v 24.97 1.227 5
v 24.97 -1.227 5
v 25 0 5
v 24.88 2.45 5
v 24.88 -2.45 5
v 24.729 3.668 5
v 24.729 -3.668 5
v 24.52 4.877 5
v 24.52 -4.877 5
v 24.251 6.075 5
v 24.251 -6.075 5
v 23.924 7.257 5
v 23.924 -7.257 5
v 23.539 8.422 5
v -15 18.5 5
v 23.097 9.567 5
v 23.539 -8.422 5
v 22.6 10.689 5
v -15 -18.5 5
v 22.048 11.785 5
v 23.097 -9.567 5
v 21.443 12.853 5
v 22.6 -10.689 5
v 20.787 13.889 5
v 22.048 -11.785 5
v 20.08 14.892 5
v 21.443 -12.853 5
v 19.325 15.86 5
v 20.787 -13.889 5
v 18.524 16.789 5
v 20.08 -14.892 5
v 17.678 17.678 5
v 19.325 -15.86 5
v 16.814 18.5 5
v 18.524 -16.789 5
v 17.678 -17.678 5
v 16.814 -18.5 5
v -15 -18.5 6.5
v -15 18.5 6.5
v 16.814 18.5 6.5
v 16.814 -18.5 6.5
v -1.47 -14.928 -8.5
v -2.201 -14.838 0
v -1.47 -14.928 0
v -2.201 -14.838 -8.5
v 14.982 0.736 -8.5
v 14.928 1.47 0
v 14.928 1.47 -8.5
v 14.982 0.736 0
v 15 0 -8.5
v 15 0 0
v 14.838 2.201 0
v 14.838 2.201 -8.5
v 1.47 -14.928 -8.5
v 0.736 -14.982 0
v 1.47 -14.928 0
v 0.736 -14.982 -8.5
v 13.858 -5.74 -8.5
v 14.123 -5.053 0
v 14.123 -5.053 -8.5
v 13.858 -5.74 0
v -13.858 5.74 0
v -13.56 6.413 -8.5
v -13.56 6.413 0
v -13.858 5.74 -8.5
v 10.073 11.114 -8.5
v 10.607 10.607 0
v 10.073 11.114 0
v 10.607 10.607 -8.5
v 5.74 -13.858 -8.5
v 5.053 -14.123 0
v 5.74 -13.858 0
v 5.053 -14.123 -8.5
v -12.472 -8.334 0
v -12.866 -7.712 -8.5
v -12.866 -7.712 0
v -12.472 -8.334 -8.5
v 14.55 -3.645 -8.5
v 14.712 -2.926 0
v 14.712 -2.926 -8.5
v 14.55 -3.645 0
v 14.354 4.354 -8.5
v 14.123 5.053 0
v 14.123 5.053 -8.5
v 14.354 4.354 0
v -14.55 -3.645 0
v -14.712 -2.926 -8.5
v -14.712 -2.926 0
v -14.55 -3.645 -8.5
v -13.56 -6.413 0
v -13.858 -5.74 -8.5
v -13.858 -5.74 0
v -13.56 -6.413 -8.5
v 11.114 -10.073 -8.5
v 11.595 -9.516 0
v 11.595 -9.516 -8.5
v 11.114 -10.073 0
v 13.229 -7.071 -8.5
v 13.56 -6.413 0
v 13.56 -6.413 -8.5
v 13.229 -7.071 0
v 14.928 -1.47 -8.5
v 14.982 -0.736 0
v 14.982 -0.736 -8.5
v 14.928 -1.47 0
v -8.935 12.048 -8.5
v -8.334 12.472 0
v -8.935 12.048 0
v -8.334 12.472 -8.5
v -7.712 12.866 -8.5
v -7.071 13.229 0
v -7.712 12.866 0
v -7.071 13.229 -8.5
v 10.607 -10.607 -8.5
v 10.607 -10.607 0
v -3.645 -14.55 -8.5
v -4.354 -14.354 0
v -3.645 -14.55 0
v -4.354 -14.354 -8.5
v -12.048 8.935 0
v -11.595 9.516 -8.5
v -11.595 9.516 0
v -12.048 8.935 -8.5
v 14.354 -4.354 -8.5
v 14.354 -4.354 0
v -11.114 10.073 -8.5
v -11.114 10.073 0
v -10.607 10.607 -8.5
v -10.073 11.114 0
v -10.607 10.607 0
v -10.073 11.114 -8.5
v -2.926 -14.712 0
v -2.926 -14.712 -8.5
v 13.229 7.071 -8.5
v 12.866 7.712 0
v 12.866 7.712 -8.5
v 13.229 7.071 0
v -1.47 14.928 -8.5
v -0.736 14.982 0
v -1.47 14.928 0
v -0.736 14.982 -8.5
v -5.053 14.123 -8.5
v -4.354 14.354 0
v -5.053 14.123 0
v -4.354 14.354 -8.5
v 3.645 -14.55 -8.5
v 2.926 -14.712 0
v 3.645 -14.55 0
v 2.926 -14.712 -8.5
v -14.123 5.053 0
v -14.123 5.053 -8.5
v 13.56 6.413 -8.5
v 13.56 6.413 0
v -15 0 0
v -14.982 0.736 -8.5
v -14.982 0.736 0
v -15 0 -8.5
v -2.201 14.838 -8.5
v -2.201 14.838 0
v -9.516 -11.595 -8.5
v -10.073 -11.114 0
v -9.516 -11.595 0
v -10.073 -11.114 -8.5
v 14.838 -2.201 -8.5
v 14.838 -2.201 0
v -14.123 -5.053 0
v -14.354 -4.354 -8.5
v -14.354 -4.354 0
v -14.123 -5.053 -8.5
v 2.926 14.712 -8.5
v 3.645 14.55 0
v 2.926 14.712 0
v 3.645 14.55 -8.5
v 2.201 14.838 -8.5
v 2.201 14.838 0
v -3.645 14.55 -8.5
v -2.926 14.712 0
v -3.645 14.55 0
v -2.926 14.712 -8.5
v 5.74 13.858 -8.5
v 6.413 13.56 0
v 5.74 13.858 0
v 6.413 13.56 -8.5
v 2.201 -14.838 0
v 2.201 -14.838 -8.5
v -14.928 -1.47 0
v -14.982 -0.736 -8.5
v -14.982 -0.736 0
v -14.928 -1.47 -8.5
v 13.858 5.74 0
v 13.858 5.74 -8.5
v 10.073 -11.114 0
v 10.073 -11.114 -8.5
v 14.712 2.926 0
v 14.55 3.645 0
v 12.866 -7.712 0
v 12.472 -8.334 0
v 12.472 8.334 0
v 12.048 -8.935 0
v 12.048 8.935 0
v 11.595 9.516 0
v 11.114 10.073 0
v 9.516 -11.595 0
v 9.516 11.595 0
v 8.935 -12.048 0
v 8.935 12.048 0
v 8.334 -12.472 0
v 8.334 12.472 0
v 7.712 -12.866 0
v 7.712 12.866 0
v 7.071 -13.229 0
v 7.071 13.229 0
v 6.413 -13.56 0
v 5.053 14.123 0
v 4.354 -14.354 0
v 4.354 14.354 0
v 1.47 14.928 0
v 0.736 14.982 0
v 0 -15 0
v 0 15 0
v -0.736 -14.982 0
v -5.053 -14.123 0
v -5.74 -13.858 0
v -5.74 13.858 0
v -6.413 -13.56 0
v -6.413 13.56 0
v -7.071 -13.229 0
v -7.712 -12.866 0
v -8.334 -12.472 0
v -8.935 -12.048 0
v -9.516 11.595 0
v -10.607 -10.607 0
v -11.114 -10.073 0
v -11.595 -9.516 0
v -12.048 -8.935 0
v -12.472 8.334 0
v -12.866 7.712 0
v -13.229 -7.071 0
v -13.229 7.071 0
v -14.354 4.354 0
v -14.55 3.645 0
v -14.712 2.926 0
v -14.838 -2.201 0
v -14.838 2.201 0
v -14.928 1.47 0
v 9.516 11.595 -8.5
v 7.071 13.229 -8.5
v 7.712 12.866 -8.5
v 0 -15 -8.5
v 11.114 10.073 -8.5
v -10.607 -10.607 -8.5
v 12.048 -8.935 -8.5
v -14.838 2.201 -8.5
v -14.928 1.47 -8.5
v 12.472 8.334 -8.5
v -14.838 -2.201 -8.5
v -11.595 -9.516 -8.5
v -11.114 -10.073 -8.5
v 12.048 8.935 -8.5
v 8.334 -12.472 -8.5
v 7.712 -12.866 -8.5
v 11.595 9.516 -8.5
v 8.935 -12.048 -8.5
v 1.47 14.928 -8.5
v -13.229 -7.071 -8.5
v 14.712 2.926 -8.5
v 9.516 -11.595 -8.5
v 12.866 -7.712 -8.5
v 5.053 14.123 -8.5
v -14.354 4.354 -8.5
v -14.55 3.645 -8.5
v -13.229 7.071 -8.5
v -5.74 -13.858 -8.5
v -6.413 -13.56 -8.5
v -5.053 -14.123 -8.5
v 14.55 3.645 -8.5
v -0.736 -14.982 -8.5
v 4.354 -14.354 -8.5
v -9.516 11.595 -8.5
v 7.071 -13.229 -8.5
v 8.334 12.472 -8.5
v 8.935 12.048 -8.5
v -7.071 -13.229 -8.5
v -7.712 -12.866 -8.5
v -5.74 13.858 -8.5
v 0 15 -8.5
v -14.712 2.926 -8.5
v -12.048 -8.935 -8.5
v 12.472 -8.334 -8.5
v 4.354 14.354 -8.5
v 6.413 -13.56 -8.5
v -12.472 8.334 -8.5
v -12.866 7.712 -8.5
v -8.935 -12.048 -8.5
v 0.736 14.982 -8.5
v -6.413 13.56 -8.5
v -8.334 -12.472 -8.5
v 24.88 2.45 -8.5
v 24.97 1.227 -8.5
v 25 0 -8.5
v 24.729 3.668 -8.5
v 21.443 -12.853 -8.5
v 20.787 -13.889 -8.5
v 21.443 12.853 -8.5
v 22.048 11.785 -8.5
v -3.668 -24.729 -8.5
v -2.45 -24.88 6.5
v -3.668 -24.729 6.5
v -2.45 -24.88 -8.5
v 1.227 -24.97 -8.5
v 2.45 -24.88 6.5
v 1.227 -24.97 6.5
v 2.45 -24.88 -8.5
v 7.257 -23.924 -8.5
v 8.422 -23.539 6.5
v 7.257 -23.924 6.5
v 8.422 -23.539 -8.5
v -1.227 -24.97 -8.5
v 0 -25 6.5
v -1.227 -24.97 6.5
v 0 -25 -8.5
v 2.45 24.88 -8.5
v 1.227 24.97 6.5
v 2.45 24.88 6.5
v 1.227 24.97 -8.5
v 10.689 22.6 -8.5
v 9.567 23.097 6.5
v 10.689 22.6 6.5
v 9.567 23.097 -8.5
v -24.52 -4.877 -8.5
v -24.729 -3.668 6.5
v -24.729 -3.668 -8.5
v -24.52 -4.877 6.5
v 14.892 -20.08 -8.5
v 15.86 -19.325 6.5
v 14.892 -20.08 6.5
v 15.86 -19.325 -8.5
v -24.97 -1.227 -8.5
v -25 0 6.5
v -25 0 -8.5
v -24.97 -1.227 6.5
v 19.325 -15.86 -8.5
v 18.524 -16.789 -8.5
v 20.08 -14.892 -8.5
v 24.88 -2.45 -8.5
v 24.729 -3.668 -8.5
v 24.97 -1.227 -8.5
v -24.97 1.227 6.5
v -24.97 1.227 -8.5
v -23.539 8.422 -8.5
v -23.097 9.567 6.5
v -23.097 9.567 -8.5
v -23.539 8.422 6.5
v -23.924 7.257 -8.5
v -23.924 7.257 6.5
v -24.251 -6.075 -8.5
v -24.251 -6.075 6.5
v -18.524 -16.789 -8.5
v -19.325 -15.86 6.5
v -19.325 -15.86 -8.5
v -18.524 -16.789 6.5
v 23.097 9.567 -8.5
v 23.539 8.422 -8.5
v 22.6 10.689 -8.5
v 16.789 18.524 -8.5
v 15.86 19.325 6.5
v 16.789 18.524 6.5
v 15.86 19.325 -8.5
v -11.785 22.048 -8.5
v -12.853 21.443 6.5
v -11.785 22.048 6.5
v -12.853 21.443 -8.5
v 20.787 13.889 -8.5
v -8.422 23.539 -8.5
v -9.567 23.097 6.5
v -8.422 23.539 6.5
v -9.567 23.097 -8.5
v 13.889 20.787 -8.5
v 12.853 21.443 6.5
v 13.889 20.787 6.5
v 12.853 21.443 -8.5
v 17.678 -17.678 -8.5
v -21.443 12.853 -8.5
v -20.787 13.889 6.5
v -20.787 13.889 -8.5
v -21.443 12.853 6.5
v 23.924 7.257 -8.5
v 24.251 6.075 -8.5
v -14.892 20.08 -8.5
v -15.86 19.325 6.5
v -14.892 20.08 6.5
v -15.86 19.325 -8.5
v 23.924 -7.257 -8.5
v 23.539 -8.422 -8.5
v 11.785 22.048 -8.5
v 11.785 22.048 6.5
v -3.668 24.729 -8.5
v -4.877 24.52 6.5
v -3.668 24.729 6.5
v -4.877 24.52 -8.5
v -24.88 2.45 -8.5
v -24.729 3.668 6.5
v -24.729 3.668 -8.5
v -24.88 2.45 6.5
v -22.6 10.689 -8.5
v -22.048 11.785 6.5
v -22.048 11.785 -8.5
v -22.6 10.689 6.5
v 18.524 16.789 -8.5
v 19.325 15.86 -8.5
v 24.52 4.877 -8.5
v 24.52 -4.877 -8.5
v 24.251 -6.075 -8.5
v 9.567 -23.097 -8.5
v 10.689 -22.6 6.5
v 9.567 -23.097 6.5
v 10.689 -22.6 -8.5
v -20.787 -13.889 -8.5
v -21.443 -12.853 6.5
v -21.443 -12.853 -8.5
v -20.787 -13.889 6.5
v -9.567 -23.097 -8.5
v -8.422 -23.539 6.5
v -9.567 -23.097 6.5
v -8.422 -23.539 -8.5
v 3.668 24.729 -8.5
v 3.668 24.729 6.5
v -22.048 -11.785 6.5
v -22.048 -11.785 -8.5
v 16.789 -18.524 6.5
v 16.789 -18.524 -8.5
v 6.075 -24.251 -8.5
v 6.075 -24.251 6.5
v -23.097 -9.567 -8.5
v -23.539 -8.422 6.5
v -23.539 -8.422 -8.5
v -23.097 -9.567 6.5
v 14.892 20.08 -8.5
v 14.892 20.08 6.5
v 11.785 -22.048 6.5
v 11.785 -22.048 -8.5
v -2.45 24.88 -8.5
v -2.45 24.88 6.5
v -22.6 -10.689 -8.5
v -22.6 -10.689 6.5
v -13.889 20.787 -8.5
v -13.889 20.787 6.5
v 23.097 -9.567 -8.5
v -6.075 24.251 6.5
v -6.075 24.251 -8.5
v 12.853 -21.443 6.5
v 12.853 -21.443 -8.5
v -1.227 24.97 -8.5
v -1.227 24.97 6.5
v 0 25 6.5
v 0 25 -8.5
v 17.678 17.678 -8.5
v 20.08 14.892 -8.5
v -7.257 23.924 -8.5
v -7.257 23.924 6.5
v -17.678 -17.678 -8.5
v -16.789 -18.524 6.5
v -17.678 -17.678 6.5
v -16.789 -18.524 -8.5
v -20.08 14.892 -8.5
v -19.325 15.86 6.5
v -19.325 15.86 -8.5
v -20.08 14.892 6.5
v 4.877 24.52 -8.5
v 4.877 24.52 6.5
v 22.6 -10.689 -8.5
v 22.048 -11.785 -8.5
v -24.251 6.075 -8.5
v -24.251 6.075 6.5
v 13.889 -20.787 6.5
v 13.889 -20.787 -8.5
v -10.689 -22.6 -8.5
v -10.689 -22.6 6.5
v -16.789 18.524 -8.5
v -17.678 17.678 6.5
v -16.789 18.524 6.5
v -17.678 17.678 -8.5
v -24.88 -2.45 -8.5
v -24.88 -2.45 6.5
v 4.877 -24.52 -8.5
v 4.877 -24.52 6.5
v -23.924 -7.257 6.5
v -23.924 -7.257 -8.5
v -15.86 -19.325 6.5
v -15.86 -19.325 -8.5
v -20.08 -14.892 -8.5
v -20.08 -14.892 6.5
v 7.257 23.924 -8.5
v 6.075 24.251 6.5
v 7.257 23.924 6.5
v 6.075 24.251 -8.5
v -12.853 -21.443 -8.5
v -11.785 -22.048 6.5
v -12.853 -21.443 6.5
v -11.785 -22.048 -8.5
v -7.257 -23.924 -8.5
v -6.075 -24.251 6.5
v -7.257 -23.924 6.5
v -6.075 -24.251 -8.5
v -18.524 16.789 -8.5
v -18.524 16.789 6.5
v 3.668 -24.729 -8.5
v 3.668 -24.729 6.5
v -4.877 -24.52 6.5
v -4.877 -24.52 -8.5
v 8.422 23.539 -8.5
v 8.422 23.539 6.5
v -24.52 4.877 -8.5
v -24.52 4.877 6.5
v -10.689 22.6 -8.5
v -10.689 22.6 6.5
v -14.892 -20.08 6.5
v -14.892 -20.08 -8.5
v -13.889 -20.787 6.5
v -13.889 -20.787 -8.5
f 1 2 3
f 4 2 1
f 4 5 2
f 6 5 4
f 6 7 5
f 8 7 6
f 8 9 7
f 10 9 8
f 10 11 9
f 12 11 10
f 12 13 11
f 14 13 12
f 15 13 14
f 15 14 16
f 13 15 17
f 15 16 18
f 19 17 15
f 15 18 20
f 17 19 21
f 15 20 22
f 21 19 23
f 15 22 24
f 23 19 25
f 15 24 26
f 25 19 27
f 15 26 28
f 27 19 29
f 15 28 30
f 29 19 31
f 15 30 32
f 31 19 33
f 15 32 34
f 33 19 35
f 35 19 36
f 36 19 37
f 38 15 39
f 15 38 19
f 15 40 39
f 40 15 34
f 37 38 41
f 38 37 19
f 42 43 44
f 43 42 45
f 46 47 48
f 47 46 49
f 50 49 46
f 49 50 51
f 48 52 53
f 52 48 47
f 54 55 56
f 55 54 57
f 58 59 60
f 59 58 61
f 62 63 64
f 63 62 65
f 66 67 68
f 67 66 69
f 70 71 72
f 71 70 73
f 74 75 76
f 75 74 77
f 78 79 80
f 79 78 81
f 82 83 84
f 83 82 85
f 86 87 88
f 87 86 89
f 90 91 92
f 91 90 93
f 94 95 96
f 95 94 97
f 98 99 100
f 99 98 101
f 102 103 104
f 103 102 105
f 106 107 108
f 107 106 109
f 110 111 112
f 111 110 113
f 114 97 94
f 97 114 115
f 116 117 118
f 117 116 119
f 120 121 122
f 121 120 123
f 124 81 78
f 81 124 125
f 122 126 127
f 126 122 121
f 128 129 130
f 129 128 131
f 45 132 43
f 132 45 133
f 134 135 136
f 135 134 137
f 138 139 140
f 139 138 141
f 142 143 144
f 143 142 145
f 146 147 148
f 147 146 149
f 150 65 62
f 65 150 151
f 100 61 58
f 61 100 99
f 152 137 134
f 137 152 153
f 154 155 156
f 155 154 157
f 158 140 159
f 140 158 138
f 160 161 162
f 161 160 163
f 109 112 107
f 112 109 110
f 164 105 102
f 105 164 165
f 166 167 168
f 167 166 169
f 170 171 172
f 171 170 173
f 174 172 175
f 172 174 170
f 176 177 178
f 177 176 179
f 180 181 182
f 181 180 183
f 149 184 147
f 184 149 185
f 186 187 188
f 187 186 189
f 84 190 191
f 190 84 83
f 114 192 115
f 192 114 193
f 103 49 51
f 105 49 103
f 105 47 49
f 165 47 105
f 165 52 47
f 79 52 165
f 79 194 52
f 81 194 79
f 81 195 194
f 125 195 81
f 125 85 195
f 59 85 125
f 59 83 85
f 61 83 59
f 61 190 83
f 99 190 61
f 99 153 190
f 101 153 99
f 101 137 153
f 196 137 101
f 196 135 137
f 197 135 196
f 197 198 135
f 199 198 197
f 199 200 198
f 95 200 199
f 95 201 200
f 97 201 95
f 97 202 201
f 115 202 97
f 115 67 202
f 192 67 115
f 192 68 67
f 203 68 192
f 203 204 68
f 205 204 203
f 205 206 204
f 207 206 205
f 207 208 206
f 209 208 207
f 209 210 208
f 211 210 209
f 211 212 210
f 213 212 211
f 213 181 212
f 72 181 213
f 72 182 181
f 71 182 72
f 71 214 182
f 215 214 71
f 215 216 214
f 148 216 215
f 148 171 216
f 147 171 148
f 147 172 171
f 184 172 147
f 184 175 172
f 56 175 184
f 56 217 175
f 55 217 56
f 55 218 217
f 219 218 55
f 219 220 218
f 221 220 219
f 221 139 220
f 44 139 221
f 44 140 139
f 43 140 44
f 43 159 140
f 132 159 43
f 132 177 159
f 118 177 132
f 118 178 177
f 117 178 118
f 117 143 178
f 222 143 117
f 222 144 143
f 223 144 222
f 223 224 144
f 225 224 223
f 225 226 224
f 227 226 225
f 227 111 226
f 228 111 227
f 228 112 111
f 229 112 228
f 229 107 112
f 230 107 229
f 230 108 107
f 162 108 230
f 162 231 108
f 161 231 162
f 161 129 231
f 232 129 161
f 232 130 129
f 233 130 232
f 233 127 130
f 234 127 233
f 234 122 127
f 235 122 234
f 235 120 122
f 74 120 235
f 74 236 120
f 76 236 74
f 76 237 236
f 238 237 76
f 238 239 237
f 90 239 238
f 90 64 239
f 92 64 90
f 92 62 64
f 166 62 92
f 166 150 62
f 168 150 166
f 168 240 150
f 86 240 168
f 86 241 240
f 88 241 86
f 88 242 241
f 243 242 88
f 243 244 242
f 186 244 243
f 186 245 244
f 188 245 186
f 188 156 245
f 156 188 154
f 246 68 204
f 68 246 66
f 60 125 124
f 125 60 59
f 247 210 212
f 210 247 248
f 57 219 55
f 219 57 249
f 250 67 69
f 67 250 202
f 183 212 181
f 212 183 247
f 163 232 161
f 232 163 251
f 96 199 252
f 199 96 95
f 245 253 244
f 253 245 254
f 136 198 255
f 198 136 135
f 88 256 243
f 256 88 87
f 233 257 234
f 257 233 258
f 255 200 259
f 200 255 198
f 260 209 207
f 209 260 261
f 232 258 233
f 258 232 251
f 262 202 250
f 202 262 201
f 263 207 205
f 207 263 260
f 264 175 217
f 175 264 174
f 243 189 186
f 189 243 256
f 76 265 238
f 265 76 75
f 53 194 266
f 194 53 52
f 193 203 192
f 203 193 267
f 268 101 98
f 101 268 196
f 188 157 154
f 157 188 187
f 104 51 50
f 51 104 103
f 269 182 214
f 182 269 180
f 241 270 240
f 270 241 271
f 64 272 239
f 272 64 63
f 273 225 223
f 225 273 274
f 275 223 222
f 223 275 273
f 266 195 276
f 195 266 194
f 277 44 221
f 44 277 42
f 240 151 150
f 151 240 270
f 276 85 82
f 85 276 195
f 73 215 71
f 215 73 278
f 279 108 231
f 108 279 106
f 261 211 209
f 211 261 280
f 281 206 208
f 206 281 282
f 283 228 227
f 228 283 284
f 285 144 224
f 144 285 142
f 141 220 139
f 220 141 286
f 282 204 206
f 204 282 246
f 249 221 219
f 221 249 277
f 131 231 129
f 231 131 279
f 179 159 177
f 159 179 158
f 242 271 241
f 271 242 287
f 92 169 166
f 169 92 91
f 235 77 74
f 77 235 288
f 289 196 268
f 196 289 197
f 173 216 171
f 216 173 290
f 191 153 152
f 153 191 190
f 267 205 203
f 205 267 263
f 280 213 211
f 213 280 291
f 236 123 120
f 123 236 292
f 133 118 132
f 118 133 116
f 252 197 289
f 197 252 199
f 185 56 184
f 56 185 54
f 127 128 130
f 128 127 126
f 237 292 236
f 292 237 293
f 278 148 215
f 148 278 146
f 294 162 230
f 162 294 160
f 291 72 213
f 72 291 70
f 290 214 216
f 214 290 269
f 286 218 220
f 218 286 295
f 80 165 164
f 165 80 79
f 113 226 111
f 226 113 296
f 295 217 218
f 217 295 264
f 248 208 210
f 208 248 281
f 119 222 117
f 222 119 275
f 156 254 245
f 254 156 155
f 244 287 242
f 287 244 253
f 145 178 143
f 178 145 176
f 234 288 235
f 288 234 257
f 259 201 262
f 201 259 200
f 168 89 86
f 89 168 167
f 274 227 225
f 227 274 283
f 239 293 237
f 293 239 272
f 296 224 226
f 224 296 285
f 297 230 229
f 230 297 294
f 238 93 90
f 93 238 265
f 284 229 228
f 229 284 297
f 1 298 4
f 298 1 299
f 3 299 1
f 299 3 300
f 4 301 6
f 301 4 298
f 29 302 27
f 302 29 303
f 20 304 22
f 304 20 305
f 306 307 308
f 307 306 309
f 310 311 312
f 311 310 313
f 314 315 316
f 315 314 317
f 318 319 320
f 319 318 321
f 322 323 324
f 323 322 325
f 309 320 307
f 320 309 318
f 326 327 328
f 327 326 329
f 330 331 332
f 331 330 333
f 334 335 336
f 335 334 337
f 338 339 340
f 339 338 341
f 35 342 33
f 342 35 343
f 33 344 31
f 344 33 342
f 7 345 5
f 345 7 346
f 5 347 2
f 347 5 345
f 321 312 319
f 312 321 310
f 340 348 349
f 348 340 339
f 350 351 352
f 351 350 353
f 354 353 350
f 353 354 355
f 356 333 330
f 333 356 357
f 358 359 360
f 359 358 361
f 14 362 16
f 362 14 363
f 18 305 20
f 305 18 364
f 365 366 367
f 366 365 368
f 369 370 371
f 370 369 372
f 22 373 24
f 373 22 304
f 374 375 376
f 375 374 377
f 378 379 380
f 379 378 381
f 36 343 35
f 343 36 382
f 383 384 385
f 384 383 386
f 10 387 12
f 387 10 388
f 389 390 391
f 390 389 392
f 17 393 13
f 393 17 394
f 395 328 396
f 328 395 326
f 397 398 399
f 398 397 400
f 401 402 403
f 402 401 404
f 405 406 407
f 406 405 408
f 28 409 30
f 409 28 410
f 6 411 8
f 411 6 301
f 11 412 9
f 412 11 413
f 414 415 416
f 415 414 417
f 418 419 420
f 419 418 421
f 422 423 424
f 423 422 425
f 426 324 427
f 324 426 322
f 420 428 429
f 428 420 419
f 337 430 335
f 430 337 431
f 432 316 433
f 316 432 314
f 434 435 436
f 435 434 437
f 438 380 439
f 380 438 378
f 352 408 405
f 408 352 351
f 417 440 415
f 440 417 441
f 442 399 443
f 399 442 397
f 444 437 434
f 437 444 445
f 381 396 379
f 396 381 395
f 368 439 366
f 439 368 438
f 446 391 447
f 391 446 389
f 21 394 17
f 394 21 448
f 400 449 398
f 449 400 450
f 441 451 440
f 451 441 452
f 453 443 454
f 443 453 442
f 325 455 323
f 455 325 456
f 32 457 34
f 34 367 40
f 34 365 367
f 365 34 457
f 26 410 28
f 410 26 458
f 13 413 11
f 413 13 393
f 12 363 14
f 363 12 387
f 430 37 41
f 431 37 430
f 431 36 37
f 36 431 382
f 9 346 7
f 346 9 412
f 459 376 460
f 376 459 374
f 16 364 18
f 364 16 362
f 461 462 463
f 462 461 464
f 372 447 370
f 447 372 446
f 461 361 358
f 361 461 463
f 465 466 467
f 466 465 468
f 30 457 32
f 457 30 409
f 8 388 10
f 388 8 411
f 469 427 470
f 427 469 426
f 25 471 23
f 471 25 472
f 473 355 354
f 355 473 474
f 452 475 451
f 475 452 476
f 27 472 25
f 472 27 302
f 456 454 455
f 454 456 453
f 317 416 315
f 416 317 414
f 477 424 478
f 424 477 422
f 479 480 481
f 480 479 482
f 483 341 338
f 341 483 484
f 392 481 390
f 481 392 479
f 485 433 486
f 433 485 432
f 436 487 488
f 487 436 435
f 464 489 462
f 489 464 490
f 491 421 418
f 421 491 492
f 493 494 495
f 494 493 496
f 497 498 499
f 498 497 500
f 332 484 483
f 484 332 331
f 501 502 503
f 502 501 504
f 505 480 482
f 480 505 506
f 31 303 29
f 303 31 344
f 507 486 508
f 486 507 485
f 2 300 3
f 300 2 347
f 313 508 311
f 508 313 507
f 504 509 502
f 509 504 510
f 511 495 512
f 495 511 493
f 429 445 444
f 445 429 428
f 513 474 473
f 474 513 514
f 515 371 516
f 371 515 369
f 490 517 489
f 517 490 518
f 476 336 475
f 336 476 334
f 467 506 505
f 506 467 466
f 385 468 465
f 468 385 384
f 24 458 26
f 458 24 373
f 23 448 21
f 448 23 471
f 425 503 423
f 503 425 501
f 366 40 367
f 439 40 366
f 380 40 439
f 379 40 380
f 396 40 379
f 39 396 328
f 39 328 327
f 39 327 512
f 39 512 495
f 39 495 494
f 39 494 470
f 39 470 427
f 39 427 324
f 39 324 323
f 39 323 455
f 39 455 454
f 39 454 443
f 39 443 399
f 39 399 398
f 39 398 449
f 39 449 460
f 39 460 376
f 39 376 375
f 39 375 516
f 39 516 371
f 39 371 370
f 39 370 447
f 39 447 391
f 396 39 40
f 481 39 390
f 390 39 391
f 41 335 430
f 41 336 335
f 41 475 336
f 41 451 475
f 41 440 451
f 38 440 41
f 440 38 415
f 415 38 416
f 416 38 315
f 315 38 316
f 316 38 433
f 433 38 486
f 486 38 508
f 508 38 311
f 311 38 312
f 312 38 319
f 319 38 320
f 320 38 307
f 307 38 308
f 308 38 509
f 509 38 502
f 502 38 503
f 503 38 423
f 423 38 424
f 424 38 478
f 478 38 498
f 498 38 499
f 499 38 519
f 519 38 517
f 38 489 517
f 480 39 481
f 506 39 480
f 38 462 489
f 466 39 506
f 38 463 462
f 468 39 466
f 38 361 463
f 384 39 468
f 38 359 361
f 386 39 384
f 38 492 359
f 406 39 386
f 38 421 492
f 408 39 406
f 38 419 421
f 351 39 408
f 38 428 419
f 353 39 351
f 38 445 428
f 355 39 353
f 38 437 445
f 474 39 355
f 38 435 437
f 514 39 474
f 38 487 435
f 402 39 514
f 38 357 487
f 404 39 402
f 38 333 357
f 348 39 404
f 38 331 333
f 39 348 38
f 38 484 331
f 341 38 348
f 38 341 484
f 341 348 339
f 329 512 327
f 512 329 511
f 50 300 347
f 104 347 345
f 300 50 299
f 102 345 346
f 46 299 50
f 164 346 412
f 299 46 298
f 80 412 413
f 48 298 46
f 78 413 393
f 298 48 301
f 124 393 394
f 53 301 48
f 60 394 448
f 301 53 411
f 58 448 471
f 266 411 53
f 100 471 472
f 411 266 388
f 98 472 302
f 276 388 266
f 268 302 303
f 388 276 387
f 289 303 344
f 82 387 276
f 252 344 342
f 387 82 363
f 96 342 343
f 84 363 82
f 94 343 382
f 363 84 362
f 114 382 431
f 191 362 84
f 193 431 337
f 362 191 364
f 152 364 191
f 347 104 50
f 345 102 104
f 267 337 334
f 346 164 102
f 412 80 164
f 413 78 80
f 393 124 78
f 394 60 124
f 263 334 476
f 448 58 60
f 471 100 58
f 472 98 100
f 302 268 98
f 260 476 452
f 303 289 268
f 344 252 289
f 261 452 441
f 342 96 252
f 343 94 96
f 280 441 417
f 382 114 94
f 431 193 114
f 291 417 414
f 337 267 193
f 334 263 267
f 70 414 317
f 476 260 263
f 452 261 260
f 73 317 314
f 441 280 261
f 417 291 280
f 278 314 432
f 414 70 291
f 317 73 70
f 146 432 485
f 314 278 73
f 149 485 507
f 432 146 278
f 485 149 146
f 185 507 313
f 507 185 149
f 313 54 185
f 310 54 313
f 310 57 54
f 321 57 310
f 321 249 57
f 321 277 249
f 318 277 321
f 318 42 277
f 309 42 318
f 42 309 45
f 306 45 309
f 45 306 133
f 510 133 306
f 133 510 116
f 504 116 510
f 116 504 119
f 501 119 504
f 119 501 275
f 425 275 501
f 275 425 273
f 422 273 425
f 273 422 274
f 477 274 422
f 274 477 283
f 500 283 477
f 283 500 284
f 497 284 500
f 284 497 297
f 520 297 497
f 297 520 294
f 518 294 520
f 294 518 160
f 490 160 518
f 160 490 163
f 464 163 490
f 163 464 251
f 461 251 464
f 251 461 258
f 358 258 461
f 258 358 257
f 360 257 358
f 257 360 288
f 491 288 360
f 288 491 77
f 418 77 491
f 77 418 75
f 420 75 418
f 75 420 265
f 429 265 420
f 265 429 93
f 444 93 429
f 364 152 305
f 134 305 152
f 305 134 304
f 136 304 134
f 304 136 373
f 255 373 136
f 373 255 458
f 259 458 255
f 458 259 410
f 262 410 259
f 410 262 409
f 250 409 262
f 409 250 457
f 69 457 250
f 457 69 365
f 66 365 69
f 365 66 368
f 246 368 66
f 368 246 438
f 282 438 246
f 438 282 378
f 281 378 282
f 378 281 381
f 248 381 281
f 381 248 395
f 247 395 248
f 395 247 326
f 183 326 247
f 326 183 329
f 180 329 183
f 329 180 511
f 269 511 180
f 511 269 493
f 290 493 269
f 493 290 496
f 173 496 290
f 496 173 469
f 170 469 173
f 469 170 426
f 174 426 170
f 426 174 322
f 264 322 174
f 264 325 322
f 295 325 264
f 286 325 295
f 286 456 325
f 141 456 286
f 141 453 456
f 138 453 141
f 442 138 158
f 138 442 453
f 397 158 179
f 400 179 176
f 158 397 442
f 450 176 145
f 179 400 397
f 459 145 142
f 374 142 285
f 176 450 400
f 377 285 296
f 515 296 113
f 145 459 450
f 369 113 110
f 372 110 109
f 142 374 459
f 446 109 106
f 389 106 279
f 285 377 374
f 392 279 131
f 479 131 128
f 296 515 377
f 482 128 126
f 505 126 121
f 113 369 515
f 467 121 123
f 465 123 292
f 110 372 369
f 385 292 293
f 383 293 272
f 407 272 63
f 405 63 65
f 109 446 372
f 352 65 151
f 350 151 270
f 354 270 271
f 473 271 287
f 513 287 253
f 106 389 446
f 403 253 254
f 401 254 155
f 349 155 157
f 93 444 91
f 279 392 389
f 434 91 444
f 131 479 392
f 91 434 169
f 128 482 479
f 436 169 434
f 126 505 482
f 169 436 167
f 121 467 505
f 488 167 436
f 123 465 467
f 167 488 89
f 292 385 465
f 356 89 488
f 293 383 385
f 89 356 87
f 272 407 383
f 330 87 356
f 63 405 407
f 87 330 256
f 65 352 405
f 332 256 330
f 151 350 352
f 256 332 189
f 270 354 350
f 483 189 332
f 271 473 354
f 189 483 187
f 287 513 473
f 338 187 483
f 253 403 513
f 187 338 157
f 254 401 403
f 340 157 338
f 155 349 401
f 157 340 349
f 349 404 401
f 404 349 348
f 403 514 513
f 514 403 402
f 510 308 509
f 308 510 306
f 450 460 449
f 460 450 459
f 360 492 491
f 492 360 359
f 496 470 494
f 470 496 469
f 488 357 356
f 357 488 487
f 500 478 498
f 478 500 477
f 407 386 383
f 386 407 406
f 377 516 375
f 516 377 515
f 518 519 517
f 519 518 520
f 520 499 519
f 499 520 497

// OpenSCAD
$fn = 128;


difference() {
			// 6.5mm above Zero pane, 8.5 below 
			// 5.0mm between board and bearing
			// 1.5mm to fit the board into
			translate([0,0,-1]) cylinder(r=25, h=15, center=true);
	union() {
		translate([0,0,3]) linear_extrude(file="cut-out.dxf", 
                                            layer="umriss", 
                                            height=6,
                                            center=true);

		translate([5,0,5+2]) cube(size=[40,37,4], center=true);
		
		translate([0,0,-1]) linear_extrude(file="cut-out.dxf",
                                            layer="holes",
                                            height=16,
                                            center=true);

		translate([0,0,-4.5]) cylinder(r=15, h=9, center=true);

		

	}
}	
